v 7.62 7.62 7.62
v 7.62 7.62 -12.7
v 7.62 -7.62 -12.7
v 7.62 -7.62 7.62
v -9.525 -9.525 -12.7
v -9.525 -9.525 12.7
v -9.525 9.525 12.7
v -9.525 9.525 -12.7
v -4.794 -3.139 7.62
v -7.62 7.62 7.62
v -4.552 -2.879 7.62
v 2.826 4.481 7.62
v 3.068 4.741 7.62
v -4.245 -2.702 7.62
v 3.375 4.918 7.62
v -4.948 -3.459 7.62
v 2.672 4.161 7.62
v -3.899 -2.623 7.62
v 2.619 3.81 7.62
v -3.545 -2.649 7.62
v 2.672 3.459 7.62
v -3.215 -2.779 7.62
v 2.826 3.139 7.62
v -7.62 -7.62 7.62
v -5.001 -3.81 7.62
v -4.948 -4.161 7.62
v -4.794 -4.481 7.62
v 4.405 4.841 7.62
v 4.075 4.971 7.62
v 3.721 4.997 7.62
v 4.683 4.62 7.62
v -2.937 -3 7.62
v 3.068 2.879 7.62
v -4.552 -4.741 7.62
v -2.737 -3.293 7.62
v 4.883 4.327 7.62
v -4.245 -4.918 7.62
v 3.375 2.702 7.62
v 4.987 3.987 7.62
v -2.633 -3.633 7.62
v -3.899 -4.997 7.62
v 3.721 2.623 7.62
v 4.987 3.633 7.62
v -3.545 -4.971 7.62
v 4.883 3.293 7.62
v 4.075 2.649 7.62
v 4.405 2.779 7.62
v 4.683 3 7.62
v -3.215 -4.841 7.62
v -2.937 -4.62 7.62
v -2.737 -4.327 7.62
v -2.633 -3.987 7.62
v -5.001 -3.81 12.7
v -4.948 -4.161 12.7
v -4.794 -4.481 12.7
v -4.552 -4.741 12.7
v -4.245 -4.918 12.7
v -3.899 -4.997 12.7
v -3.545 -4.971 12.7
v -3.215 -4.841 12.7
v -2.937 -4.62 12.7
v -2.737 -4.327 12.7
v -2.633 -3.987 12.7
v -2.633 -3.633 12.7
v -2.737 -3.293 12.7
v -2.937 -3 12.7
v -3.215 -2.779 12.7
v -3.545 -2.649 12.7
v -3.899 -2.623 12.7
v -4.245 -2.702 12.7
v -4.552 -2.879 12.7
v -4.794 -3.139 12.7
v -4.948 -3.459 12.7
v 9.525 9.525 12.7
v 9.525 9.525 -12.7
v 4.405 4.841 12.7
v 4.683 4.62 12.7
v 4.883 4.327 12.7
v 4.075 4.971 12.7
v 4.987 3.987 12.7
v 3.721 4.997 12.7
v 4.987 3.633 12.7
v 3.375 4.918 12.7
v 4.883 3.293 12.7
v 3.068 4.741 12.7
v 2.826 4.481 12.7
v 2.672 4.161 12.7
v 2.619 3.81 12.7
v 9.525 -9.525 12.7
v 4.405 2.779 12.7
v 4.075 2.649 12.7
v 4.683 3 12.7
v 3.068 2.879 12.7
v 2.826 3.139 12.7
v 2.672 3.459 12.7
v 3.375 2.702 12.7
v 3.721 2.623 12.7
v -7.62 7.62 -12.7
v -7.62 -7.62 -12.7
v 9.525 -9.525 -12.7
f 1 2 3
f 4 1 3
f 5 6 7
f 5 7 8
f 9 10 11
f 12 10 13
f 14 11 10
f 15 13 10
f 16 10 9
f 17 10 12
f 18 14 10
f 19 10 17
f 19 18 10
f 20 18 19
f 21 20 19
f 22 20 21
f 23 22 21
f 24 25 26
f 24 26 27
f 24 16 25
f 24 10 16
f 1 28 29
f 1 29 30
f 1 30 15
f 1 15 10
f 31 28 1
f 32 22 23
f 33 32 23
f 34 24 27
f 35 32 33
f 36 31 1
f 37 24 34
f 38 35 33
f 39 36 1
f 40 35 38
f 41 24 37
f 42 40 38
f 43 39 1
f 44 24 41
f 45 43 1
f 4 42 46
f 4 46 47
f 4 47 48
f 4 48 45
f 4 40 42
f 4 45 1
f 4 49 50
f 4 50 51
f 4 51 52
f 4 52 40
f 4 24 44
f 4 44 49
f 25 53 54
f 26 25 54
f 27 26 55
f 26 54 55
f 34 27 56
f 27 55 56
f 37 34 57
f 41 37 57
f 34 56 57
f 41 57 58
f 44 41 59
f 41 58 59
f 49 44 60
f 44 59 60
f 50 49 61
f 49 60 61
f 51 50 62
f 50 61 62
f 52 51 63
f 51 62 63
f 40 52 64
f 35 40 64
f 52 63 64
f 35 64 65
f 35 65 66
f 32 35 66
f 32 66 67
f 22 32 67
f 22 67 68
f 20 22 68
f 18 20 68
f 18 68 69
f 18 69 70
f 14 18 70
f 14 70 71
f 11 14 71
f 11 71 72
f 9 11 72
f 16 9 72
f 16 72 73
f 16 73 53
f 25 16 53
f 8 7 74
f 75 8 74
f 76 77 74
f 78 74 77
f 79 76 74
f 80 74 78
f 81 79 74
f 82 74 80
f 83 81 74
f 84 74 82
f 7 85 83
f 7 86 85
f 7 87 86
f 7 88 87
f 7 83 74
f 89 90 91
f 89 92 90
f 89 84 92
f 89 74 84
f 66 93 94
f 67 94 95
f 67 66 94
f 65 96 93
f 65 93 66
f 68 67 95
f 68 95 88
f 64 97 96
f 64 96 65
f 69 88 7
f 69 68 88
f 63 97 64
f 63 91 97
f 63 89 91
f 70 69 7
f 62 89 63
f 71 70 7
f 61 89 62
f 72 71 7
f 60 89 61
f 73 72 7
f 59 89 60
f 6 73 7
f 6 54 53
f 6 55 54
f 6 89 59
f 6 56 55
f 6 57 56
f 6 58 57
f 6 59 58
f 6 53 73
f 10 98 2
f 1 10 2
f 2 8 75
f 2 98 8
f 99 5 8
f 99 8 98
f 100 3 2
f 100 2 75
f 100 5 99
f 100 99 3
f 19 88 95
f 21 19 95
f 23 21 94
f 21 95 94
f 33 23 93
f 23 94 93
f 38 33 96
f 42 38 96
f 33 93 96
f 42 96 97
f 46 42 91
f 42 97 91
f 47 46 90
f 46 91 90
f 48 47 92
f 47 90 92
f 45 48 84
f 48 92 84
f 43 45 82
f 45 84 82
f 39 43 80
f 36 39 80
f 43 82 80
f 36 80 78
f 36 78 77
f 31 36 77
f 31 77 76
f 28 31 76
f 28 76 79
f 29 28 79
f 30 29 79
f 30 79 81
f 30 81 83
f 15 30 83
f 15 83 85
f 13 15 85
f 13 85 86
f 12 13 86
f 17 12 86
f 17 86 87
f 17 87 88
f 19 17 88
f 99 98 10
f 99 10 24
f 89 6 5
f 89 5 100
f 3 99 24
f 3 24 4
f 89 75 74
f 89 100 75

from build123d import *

# Parameters (mm, degrees)
F1_DEPTH = 9.525
F2_W     = 15.24
F2_H     = 15.24
F3_DEPTH = 20.32
F5_D     = 2.38125


with BuildPart() as f1:
    # F0 (on Front) → F1 (new body, symmetric)
    with BuildSketch(Plane.XZ):
        Polygon((9.525, 12.7), (-9.525, 12.7), (-9.525, -12.7), (9.525, -12.7), (9.525, 7.62), align=None)
    extrude(amount=F1_DEPTH, both=True)

    # F2 (on face) → F3 (cut)
    with BuildSketch(Plane(origin=(0, 0, -12.7), x_dir=(1, 0, 0), z_dir=(0, 0, -1))):
        Rectangle(F2_W, F2_H)
    extrude(amount=-F3_DEPTH, mode=Mode.SUBTRACT)

    # F5 (through all)
    with Locations(Plane(origin=(0, 0, 7.62), x_dir=(1, 0, 0), z_dir=(0, 0, -1))):
        with Locations((-3.81, 3.81), (3.81, -3.81)):
            Hole(F5_D / 2)


solid = f1.part
